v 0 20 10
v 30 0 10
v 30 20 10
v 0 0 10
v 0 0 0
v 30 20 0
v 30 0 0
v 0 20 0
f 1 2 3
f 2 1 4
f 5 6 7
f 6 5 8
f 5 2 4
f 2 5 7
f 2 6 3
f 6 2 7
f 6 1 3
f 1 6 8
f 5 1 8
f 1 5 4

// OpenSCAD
// file: ../../common/utils.scad
// Common utilities and shared variables
// Include this file at the top of your models:
//   include <../../common/utils.scad>

// ── Units ────────────────────────────────────────────────────────────────────
// All dimensions in millimeters

// ── Print tolerances ─────────────────────────────────────────────────────────
// Gap to add when two parts need to fit together (e.g., peg into a hole)
FIT_CLEARANCE = 0.2;  // mm

// Tolerance for press-fit / tight connections
PRESS_FIT = 0.1;  // mm

// ── Quality settings ─────────────────────────────────────────────────────────
// Override per-model if needed
$fn = $preview ? 32 : 128;  // Circle/sphere resolution

// ── Common layer heights ──────────────────────────────────────────────────────
LAYER_HEIGHT      = 0.2;   // standard
FIRST_LAYER       = 0.3;   // slightly thicker first layer
MIN_WALL          = 0.4;   // single extrusion width (0.4 mm nozzle)
// main file
// Template for a new model project.
// Copy this directory to models/<your-model-name>/ and rename accordingly.
//
// Usage: openscad -o output.stl <model>.scad

include <../../common/utils.scad>

// ── Parameters ────────────────────────────────────────────────────────────────
// Expose dimensions as variables so they can be overridden from the CLI:
//   openscad -D "width=40" -o output.stl model.scad

width  = 30;  // mm
depth  = 20;  // mm
height = 10;  // mm

// ── Model ─────────────────────────────────────────────────────────────────────
cube([width, depth, height]);
